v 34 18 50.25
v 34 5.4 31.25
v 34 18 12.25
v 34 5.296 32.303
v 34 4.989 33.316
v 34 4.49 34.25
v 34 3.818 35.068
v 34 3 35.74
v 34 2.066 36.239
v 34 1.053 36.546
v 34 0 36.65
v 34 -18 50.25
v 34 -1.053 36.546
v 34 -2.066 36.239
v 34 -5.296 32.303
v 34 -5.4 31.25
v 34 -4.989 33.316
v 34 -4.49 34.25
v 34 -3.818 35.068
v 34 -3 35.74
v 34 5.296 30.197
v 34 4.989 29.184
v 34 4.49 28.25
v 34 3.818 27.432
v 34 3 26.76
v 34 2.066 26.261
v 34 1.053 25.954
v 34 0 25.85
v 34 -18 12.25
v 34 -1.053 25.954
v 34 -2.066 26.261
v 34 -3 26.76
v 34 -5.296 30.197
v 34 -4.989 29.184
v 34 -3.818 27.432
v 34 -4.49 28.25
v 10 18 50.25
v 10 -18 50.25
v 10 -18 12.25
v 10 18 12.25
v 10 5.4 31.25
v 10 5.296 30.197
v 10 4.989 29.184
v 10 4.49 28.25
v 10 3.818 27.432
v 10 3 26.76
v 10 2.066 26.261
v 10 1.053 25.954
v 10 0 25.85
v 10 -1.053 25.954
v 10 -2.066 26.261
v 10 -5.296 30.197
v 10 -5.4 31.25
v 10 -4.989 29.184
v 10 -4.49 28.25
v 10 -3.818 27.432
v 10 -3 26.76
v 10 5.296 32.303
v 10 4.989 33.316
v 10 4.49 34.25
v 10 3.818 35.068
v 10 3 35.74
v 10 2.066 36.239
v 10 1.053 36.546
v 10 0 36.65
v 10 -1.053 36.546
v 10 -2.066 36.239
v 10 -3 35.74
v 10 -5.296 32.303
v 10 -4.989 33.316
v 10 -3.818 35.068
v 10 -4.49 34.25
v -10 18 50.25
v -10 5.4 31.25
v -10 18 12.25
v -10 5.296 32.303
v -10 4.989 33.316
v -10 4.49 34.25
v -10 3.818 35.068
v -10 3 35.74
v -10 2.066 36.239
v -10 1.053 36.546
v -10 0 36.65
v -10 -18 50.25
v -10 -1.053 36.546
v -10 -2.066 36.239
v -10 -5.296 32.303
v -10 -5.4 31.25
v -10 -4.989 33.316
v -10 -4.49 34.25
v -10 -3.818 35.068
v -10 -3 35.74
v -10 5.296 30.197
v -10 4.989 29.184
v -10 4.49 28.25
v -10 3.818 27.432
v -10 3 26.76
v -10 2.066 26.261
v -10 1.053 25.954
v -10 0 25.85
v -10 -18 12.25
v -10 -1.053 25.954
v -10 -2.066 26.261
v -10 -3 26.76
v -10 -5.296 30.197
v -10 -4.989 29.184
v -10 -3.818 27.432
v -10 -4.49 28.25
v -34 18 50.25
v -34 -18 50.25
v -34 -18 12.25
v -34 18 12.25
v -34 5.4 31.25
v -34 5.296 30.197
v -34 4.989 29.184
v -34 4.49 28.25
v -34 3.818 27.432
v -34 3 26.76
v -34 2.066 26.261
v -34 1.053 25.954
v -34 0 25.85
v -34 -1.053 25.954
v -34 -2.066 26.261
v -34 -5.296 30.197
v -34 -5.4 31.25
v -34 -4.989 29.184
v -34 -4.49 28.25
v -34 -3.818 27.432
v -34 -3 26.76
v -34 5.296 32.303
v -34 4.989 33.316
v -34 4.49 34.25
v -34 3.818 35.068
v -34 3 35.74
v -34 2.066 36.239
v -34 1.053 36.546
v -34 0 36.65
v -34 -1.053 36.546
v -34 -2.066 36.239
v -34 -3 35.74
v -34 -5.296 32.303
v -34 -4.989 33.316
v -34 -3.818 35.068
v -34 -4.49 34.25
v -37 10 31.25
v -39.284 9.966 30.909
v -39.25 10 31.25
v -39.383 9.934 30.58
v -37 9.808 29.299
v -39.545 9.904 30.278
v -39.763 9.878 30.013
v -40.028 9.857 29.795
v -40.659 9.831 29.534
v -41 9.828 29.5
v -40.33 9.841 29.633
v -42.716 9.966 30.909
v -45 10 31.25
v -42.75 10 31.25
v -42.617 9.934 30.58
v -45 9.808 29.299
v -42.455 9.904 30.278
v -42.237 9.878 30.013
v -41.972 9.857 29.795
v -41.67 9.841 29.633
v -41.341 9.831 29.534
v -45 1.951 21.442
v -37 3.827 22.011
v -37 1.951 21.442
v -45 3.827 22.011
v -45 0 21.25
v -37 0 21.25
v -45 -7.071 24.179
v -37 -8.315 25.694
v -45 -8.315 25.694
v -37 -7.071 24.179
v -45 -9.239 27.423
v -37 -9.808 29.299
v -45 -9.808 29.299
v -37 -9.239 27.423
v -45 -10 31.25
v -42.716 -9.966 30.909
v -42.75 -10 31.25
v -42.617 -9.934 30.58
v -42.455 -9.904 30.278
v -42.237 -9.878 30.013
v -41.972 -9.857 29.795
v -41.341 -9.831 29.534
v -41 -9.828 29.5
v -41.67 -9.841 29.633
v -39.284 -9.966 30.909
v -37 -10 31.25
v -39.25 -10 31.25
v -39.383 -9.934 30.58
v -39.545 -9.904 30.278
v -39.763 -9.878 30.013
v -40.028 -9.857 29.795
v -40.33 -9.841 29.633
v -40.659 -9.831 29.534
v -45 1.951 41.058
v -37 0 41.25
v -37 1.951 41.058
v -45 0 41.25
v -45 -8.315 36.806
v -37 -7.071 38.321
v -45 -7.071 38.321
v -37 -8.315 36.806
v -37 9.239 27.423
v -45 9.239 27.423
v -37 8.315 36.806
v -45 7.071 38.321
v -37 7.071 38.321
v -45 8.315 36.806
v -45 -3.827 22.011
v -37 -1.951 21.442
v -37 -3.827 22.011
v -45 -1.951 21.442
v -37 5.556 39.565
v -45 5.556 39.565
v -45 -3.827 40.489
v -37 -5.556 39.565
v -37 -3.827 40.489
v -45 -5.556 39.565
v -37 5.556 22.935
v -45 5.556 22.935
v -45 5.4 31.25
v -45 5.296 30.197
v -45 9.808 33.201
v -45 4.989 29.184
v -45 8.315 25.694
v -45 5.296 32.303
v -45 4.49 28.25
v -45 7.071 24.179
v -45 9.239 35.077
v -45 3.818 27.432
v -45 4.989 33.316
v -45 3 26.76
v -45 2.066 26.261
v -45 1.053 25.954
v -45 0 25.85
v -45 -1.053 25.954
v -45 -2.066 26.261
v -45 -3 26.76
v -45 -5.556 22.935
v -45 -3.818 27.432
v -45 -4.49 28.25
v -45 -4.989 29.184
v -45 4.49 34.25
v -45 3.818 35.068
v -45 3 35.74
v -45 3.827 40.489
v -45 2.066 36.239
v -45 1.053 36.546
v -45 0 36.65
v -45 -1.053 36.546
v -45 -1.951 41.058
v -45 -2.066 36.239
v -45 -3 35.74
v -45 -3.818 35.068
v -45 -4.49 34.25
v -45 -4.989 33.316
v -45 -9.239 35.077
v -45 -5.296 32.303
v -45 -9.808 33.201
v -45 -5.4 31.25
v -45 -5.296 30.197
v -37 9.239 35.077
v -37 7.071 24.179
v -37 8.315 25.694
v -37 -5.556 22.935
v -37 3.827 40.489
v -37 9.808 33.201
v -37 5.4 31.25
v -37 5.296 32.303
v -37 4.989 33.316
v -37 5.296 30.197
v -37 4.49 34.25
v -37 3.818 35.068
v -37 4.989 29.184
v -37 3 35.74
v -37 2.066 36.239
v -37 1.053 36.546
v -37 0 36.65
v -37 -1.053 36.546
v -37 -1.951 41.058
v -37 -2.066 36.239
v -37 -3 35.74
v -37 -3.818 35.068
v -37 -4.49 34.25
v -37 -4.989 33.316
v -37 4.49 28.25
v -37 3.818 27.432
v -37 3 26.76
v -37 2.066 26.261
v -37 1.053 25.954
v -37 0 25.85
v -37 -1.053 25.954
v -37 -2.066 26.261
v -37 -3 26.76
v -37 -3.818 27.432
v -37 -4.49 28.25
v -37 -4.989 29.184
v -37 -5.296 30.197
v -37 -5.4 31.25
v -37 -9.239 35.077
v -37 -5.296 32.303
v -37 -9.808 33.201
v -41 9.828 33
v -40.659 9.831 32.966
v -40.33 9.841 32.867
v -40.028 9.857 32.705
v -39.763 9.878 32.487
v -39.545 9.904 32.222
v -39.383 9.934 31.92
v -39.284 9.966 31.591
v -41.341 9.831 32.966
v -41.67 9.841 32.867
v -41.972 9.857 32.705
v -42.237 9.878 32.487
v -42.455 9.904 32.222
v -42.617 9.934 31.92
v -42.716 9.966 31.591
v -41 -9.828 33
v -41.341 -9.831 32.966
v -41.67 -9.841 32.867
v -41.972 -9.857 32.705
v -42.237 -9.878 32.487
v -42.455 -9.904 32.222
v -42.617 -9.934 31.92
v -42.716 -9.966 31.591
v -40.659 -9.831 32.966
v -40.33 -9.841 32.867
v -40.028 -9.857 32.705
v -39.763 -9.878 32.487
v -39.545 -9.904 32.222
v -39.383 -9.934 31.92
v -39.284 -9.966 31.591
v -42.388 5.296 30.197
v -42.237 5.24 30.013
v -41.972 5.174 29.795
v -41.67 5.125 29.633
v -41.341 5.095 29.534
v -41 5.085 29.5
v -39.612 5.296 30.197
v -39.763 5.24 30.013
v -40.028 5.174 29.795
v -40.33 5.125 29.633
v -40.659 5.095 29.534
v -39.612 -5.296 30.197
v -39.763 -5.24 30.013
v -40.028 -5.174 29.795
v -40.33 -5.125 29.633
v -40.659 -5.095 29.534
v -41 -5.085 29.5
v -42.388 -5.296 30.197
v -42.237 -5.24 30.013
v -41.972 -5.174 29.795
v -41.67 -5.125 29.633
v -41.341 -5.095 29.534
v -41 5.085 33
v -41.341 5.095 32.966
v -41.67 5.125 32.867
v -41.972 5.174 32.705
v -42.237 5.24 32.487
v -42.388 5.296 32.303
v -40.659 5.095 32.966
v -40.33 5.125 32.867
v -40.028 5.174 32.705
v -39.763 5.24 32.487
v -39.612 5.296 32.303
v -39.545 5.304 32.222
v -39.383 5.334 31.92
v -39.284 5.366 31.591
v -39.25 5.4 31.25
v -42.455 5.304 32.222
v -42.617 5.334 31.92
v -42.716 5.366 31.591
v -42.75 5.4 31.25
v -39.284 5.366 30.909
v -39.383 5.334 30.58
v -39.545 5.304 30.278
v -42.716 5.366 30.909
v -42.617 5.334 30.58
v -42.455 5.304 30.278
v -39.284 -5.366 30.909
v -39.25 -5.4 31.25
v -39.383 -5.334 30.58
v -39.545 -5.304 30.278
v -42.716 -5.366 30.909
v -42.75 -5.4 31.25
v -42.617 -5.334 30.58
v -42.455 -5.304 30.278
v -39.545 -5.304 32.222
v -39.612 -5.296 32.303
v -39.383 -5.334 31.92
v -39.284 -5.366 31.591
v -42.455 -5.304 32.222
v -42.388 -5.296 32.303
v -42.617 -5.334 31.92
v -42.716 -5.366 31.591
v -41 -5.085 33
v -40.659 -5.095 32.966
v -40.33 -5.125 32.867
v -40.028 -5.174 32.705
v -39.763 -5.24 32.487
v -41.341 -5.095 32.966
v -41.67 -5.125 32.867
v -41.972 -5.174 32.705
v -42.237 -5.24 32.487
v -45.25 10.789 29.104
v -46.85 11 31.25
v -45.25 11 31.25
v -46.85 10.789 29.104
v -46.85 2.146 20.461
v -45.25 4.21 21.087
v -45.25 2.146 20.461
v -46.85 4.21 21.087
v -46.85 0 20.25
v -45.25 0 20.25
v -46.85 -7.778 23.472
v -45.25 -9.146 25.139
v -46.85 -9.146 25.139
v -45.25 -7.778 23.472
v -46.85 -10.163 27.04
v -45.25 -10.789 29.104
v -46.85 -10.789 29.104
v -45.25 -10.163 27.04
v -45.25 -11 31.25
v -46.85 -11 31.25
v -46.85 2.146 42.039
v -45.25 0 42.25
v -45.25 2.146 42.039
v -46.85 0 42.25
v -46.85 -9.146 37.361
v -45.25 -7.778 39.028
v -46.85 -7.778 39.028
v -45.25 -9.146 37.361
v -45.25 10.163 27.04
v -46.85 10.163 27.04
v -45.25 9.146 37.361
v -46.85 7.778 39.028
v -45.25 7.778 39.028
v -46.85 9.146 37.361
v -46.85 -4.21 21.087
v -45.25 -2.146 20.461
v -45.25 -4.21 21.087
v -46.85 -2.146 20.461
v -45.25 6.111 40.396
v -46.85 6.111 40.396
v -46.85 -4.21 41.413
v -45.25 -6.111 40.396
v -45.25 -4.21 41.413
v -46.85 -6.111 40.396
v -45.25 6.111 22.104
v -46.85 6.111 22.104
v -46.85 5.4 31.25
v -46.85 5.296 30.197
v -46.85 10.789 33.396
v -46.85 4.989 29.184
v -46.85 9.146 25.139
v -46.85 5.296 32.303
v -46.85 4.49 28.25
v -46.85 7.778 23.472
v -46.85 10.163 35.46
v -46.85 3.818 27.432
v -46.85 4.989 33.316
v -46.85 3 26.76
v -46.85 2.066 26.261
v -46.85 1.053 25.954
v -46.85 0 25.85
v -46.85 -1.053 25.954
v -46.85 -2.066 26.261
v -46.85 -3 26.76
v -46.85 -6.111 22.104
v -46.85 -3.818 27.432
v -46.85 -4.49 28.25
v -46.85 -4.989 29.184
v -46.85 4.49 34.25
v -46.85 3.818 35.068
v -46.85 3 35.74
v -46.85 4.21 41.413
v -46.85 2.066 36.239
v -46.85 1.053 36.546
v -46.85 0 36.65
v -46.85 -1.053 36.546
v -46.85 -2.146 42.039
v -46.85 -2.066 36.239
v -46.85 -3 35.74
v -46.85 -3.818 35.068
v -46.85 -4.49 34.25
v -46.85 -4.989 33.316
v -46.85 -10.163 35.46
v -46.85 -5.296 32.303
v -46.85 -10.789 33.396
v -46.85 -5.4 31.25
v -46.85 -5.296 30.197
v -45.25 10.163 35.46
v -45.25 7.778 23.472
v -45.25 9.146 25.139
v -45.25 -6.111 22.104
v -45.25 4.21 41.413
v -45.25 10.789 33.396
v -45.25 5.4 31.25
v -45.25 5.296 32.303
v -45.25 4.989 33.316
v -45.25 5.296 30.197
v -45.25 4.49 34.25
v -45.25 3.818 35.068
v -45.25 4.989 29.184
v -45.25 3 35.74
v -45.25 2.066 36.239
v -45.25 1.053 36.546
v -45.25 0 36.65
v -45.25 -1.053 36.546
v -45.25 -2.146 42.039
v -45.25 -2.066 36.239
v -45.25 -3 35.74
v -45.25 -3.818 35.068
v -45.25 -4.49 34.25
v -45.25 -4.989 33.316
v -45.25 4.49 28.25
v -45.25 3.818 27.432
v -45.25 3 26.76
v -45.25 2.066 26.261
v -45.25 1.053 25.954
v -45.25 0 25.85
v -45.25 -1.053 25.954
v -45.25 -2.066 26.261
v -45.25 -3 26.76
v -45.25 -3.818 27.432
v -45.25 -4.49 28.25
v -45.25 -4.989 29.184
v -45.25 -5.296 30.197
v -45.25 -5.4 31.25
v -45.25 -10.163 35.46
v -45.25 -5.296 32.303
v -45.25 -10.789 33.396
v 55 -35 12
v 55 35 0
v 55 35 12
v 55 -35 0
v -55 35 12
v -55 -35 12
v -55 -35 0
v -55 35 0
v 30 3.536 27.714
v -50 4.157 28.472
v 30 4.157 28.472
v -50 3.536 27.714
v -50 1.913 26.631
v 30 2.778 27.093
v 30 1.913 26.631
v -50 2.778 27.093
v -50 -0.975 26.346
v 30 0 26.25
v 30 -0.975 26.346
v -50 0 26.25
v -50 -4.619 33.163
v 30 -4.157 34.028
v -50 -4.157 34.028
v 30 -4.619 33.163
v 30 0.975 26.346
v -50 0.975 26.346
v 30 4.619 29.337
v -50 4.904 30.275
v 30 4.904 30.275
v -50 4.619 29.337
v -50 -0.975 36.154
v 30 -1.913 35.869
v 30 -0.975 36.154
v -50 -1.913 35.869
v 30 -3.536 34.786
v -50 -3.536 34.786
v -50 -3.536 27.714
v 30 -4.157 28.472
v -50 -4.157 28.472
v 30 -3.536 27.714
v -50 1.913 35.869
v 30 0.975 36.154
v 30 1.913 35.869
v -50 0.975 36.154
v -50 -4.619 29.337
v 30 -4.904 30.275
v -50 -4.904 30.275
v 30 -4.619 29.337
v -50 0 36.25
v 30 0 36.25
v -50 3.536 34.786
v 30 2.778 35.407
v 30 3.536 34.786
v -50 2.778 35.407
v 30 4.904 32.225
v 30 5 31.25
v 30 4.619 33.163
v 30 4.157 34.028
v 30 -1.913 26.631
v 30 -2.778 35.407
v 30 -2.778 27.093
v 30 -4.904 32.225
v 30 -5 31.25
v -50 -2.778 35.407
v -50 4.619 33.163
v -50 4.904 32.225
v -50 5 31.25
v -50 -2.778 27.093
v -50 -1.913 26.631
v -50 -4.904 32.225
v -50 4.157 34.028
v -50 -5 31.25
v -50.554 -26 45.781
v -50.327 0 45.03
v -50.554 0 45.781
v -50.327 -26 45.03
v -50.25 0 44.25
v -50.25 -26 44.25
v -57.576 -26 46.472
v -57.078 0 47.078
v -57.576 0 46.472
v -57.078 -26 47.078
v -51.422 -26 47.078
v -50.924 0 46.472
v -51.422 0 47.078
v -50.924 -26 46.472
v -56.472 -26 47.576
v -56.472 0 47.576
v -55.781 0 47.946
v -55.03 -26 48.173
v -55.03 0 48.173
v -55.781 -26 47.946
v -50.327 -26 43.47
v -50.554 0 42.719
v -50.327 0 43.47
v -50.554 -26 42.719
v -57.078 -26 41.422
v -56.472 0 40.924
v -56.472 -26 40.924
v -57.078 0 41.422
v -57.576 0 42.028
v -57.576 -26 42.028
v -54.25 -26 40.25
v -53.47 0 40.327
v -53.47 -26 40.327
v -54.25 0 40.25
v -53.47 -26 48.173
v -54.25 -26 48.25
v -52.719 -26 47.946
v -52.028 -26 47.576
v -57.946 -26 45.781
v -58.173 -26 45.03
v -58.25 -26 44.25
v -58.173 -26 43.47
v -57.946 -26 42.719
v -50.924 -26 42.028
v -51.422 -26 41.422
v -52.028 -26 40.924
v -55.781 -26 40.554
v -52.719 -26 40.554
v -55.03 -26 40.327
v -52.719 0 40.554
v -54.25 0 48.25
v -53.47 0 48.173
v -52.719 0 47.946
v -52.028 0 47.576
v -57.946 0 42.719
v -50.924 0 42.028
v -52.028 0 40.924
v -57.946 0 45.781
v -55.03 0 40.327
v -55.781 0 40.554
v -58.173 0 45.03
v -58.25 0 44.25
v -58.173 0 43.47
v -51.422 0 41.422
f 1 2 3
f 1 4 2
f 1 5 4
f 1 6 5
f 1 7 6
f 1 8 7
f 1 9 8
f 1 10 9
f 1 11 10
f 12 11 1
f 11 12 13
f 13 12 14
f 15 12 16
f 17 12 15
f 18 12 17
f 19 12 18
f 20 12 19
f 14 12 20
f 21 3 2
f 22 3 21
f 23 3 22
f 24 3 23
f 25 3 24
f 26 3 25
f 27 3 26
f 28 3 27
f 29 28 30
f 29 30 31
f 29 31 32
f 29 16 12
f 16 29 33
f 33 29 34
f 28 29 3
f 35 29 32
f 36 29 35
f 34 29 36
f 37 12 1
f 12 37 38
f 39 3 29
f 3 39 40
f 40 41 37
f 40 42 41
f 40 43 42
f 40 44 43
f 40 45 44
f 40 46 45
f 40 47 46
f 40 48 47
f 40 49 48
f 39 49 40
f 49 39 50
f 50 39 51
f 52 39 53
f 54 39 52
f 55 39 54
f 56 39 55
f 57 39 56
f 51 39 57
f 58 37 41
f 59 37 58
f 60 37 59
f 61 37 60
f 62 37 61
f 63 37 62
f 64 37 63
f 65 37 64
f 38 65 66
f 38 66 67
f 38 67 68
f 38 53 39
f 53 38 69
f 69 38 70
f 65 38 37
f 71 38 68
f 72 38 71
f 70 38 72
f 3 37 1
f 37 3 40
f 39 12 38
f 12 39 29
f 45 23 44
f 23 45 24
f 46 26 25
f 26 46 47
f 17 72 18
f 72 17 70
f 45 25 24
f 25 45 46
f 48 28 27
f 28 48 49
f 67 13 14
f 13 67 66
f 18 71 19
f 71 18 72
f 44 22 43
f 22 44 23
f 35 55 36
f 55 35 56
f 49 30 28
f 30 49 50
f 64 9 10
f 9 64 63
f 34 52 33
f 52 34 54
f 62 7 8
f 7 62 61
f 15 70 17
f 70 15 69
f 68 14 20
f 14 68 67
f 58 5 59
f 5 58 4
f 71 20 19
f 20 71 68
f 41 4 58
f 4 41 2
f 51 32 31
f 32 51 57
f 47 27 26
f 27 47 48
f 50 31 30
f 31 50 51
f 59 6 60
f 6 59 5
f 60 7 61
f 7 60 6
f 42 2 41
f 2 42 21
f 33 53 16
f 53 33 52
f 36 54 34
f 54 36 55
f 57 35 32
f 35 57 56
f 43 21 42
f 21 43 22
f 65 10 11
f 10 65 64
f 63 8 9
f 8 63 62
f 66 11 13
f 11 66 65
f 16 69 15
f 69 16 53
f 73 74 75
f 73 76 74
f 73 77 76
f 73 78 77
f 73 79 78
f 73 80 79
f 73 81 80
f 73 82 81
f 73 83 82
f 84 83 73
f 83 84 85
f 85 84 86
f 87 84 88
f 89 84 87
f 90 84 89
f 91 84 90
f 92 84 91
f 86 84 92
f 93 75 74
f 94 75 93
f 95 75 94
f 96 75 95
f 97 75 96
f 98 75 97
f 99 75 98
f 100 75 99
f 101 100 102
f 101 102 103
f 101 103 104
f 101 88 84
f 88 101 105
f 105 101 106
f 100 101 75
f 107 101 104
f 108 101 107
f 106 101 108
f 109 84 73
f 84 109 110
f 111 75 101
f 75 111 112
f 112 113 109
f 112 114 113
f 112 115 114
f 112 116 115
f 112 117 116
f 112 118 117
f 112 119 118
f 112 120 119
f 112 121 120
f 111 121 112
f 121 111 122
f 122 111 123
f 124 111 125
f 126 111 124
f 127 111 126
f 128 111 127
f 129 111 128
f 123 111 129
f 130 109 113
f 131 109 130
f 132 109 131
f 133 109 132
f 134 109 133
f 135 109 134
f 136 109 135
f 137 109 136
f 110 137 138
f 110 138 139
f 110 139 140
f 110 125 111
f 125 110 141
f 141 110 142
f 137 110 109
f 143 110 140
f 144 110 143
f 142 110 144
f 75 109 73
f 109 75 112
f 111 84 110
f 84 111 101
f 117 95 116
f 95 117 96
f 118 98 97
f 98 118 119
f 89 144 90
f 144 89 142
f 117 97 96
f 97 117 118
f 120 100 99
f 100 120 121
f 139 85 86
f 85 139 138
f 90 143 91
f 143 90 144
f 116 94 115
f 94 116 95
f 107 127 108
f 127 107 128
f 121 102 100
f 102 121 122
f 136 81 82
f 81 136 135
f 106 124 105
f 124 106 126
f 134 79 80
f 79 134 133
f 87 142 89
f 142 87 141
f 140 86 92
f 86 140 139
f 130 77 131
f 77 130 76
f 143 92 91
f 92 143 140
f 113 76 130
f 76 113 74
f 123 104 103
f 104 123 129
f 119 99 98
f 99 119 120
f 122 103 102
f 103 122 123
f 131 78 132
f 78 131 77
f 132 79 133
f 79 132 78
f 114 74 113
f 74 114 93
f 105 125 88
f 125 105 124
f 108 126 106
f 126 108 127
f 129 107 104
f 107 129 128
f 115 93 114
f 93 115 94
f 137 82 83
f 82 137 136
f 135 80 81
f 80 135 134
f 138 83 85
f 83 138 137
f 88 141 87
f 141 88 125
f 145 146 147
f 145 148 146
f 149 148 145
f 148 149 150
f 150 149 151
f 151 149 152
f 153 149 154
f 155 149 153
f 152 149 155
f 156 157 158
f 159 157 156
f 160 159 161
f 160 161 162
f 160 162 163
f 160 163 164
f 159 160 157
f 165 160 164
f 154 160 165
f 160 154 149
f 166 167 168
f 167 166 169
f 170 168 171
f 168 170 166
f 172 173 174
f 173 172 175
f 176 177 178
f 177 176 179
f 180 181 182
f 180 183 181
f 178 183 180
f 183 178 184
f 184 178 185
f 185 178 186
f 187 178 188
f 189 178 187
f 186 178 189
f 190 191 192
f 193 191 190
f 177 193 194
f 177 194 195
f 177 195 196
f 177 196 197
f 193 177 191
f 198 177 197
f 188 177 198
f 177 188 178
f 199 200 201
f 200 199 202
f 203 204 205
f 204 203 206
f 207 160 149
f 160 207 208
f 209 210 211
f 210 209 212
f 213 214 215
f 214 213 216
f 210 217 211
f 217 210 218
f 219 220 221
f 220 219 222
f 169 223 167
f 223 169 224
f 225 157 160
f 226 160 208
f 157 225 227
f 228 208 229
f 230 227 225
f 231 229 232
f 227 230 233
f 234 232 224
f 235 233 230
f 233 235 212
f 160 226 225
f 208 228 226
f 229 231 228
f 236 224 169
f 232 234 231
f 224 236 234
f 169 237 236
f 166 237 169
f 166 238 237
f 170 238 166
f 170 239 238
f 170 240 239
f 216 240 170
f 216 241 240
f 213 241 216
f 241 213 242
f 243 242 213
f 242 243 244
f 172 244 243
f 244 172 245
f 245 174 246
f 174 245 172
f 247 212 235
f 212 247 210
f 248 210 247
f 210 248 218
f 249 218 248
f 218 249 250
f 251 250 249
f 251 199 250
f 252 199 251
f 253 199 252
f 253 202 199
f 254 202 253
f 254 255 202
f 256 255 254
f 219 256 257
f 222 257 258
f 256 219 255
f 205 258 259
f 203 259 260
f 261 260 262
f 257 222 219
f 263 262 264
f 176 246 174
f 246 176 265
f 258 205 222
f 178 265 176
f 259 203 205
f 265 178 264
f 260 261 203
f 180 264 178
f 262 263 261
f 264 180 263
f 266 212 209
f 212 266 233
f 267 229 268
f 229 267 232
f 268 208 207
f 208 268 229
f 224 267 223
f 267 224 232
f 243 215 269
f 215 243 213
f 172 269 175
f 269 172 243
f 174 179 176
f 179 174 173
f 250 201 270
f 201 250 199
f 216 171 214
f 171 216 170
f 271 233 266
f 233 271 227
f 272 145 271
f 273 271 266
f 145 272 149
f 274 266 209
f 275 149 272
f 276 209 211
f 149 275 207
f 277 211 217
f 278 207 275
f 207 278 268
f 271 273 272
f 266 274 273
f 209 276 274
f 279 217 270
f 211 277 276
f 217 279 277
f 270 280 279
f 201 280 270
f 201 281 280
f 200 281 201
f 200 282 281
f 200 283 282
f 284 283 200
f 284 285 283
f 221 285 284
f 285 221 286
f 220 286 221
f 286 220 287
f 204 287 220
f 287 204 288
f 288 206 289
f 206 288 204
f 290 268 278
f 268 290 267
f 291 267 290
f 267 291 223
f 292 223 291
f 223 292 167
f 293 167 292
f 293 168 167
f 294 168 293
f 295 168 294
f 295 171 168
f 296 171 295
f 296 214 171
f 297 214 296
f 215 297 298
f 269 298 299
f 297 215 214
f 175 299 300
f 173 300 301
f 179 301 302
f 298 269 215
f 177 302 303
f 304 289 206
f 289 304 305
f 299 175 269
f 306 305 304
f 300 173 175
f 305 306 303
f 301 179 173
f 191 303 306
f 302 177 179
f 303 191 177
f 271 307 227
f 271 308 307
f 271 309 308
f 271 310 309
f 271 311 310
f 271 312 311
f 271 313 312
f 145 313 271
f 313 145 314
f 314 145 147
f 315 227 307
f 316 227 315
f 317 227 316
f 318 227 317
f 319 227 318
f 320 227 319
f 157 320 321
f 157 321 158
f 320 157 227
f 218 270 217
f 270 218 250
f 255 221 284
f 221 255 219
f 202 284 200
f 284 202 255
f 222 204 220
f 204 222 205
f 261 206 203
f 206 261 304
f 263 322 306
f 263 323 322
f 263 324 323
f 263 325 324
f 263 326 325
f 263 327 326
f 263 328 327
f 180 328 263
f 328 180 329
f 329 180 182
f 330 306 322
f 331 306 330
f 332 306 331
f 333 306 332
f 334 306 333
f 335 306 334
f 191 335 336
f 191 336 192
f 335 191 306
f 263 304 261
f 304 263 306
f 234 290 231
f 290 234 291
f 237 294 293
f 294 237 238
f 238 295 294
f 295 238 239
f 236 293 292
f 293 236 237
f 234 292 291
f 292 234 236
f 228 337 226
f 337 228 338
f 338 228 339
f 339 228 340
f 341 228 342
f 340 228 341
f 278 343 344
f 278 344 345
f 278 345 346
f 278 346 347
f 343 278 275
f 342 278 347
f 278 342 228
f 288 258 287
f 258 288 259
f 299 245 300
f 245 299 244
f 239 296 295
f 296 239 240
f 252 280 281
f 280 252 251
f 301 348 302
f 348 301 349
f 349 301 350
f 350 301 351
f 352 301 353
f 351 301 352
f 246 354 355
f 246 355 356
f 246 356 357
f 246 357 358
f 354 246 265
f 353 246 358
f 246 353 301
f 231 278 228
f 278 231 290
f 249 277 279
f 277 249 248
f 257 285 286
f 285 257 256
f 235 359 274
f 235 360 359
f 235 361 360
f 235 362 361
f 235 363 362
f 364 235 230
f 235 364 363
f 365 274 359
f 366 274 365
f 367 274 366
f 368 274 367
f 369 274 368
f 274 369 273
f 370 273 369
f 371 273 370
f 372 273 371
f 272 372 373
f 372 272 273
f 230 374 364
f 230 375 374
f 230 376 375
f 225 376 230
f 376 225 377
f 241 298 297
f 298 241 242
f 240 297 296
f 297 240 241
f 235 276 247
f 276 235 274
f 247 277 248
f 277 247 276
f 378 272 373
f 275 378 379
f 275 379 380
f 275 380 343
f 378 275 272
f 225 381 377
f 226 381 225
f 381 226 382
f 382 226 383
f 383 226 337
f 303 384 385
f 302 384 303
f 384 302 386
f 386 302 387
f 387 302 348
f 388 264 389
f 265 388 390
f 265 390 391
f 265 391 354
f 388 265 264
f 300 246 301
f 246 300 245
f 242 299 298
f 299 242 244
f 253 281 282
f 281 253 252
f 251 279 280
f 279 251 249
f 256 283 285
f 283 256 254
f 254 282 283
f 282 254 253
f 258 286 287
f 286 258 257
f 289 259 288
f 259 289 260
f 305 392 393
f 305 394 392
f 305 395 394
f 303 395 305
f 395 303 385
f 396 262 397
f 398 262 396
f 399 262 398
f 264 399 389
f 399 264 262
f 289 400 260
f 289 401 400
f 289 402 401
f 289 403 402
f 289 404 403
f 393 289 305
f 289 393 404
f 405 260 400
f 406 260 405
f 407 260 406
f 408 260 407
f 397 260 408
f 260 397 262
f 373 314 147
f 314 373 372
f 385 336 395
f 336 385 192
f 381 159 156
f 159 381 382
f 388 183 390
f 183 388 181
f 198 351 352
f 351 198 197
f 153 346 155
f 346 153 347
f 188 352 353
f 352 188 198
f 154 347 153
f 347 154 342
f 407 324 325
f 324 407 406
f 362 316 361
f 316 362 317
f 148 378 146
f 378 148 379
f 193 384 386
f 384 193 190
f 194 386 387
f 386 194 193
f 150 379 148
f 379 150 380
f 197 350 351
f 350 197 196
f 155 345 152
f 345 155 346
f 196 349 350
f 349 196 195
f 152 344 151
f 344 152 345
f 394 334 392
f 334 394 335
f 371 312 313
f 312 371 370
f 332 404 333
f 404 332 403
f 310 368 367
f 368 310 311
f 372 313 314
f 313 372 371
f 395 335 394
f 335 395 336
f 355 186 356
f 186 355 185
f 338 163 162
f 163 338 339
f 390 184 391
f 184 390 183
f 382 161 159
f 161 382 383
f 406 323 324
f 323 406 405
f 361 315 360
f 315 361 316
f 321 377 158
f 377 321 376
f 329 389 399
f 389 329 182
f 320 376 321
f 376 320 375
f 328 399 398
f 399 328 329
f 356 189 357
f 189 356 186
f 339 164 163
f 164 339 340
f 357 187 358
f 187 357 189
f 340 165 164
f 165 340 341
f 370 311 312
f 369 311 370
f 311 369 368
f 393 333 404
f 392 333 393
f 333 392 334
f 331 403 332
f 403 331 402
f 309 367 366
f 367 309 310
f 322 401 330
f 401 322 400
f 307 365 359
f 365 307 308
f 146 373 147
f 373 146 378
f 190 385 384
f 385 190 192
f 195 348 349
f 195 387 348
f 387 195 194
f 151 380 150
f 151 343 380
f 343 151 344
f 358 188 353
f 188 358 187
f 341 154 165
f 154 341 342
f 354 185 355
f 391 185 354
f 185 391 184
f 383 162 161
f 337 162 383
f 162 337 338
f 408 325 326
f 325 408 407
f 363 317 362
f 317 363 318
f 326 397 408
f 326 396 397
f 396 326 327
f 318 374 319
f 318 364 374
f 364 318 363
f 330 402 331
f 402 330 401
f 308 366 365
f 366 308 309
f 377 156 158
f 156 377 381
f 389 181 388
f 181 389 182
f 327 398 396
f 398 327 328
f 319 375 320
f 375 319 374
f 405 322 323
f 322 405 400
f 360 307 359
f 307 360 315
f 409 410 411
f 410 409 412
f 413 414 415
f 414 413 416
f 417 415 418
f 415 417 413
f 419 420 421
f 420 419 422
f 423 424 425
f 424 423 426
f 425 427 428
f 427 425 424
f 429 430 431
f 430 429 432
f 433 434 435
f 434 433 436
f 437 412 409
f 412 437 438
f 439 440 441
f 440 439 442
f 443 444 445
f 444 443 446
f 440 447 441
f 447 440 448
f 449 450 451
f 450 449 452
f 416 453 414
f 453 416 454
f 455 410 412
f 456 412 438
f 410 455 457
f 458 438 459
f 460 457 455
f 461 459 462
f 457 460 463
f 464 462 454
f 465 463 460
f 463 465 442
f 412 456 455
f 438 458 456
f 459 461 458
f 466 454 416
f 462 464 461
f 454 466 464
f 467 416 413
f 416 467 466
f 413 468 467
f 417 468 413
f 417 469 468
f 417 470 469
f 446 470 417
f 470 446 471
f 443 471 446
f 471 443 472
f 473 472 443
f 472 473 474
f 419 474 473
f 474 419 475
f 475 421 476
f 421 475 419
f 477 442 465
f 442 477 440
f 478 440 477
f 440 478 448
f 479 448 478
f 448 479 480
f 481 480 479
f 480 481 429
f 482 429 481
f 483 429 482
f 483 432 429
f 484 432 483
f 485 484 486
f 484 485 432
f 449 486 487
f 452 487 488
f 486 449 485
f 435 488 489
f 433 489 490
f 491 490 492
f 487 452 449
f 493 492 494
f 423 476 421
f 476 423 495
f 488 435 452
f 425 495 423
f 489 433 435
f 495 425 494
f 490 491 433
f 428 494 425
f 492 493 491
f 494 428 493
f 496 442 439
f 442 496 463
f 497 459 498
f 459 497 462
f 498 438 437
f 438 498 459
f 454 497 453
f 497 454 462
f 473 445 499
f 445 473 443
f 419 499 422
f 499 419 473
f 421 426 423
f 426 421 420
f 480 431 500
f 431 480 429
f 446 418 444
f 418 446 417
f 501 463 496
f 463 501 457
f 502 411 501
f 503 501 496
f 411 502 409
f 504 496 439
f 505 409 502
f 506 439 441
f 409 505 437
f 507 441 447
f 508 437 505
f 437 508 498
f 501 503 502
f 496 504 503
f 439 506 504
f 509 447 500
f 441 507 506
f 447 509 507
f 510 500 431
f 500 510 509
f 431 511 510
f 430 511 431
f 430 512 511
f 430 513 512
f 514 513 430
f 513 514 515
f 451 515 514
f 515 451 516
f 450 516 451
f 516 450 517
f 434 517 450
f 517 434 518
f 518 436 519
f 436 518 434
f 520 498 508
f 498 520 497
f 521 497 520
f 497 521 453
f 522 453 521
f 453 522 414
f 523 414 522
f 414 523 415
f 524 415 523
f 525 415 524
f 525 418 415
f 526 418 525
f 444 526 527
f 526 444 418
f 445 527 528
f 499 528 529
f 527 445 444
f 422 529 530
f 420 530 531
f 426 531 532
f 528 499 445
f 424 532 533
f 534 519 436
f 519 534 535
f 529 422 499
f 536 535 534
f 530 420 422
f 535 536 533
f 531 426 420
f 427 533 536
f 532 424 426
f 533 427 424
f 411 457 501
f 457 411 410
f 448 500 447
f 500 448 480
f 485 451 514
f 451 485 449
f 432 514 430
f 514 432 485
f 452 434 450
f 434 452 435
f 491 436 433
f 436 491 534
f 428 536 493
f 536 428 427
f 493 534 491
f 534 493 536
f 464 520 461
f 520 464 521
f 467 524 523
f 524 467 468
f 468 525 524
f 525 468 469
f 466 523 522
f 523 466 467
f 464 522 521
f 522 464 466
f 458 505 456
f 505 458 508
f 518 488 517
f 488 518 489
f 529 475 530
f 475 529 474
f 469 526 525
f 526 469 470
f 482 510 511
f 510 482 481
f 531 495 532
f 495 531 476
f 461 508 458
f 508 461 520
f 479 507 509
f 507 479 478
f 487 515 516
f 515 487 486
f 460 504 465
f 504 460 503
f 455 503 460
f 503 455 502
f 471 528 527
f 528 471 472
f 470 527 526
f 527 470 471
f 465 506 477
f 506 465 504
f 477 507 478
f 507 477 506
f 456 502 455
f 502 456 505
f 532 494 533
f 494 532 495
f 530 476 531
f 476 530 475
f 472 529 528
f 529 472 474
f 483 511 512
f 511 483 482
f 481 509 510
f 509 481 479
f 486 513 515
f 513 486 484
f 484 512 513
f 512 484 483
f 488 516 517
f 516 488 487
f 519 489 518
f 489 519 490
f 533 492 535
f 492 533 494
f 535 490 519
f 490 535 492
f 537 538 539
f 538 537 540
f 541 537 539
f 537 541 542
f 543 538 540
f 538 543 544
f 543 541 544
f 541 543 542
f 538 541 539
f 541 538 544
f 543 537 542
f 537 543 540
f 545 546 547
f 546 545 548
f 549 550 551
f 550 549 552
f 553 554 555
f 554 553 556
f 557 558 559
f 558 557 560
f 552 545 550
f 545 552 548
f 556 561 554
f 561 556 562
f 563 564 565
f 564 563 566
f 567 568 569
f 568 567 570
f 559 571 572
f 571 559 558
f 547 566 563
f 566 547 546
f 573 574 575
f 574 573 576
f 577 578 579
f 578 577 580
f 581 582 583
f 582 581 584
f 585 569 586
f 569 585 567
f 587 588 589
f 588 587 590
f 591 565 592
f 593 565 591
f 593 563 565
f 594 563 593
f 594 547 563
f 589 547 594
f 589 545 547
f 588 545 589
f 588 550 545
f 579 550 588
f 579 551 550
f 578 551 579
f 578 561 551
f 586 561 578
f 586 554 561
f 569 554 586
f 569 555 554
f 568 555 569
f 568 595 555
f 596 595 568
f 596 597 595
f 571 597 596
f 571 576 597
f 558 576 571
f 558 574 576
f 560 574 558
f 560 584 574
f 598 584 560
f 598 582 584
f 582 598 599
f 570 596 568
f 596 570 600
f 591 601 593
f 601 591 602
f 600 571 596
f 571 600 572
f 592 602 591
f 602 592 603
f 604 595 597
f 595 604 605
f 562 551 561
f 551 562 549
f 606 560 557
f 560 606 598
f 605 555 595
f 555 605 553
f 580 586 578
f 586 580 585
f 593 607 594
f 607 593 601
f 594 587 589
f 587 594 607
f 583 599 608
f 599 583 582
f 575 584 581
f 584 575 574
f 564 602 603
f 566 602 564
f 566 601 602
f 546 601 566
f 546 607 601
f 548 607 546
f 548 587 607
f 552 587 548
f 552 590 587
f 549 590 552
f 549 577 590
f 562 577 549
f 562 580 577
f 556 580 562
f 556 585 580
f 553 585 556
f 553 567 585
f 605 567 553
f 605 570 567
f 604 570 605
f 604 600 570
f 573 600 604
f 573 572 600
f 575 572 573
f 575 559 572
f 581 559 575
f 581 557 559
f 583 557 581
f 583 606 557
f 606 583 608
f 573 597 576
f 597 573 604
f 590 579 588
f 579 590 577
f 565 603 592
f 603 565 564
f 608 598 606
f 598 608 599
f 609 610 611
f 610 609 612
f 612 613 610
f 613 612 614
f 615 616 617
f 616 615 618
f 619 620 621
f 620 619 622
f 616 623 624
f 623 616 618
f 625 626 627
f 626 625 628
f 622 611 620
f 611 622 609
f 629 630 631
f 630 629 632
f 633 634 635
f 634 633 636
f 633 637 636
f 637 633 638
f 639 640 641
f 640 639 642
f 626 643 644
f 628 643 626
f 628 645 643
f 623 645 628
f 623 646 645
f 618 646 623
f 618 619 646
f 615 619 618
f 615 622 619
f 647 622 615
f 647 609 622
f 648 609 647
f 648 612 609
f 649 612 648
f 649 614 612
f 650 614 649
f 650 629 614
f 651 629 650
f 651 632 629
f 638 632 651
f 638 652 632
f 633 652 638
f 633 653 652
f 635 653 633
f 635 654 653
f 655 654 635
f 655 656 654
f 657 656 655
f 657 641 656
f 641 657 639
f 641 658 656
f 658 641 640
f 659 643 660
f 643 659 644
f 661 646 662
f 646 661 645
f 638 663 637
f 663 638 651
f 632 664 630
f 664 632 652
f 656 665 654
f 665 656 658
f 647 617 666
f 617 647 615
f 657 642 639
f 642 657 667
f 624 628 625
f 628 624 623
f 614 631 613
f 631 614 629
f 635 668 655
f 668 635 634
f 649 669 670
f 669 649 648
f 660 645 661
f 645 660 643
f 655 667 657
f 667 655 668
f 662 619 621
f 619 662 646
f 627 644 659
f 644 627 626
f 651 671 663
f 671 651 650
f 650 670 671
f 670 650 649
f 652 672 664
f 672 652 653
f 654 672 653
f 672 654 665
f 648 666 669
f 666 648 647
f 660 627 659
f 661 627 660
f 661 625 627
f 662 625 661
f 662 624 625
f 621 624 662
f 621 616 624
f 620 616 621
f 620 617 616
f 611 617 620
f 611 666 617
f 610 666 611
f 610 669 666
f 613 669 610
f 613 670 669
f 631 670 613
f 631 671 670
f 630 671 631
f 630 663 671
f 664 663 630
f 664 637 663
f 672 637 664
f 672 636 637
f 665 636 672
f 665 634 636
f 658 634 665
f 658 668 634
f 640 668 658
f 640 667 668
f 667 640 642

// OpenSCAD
$fn = 32;

// ------------------------------------------------------------------------
// Machine vise: screw d10, jaws 24 x 38 mm
// Every part is its own module, assembly() places every instance.
// ------------------------------------------------------------------------

// --- part 1 ---
module vise_bed() {
  difference() {
    translate([-55, -35, 0]) cube([110, 70, 12]);
  }
}

// --- part 2 ---
module vise_jaw() {
  difference() {
    translate([-12, -18, 0]) cube([24, 36, 38]);
    translate([0, 0, 19]) rotate([0, 90, 0]) cylinder(h = 26, d = 10.8, center = true);
  }
}

// --- part 3 ---
module vise_screw() {
  translate([0, 0, -40]) cylinder(h = 80, d = 10);
}

// --- part 4 ---
module screw_collar() {
  difference() {
    cylinder(h = 8, d = 20);
    translate([0, 0, -1]) cylinder(h = 10, d = 10.8);
    translate([0, 0, 4]) rotate([90, 0, 0]) cylinder(h = 22, d = 3.5, center = true);
  }
}

// --- part 5 ---
module screw_washer() {
  difference() {
      translate([0, 0, 0]) cylinder(h = 1.6, d = 22);
      translate([0, 0, -1]) cylinder(h = 3.6, d = 10.8);
    }
}

// --- part 6 ---
module vise_handle() {
  cylinder(h = 26, d = 8);
}

// --- assembly ---
module assembly() {
  color([0.80, 0.24, 0.20]) translate([0, 0, 0]) rotate([0, 0, 0]) vise_bed();
  color([0.20, 0.45, 0.75]) translate([22, 0, 12.25]) rotate([0, 0, 0]) vise_jaw();
  color([0.25, 0.62, 0.32]) translate([-22, 0, 12.25]) rotate([0, 0, 0]) vise_jaw();
  color([0.92, 0.70, 0.18]) translate([-10, 0, 31.25]) rotate([0, 90, 0]) vise_screw();
  color([0.58, 0.35, 0.70]) translate([-45, 0, 31.25]) rotate([0, 90, 0]) screw_collar();
  color([0.16, 0.66, 0.66]) translate([-46.85, 0, 31.25]) rotate([0, 90, 0]) screw_washer();
  color([0.85, 0.48, 0.18]) translate([-54.25, 0, 44.25]) rotate([90, 0, 0]) vise_handle();
}

assembly();
